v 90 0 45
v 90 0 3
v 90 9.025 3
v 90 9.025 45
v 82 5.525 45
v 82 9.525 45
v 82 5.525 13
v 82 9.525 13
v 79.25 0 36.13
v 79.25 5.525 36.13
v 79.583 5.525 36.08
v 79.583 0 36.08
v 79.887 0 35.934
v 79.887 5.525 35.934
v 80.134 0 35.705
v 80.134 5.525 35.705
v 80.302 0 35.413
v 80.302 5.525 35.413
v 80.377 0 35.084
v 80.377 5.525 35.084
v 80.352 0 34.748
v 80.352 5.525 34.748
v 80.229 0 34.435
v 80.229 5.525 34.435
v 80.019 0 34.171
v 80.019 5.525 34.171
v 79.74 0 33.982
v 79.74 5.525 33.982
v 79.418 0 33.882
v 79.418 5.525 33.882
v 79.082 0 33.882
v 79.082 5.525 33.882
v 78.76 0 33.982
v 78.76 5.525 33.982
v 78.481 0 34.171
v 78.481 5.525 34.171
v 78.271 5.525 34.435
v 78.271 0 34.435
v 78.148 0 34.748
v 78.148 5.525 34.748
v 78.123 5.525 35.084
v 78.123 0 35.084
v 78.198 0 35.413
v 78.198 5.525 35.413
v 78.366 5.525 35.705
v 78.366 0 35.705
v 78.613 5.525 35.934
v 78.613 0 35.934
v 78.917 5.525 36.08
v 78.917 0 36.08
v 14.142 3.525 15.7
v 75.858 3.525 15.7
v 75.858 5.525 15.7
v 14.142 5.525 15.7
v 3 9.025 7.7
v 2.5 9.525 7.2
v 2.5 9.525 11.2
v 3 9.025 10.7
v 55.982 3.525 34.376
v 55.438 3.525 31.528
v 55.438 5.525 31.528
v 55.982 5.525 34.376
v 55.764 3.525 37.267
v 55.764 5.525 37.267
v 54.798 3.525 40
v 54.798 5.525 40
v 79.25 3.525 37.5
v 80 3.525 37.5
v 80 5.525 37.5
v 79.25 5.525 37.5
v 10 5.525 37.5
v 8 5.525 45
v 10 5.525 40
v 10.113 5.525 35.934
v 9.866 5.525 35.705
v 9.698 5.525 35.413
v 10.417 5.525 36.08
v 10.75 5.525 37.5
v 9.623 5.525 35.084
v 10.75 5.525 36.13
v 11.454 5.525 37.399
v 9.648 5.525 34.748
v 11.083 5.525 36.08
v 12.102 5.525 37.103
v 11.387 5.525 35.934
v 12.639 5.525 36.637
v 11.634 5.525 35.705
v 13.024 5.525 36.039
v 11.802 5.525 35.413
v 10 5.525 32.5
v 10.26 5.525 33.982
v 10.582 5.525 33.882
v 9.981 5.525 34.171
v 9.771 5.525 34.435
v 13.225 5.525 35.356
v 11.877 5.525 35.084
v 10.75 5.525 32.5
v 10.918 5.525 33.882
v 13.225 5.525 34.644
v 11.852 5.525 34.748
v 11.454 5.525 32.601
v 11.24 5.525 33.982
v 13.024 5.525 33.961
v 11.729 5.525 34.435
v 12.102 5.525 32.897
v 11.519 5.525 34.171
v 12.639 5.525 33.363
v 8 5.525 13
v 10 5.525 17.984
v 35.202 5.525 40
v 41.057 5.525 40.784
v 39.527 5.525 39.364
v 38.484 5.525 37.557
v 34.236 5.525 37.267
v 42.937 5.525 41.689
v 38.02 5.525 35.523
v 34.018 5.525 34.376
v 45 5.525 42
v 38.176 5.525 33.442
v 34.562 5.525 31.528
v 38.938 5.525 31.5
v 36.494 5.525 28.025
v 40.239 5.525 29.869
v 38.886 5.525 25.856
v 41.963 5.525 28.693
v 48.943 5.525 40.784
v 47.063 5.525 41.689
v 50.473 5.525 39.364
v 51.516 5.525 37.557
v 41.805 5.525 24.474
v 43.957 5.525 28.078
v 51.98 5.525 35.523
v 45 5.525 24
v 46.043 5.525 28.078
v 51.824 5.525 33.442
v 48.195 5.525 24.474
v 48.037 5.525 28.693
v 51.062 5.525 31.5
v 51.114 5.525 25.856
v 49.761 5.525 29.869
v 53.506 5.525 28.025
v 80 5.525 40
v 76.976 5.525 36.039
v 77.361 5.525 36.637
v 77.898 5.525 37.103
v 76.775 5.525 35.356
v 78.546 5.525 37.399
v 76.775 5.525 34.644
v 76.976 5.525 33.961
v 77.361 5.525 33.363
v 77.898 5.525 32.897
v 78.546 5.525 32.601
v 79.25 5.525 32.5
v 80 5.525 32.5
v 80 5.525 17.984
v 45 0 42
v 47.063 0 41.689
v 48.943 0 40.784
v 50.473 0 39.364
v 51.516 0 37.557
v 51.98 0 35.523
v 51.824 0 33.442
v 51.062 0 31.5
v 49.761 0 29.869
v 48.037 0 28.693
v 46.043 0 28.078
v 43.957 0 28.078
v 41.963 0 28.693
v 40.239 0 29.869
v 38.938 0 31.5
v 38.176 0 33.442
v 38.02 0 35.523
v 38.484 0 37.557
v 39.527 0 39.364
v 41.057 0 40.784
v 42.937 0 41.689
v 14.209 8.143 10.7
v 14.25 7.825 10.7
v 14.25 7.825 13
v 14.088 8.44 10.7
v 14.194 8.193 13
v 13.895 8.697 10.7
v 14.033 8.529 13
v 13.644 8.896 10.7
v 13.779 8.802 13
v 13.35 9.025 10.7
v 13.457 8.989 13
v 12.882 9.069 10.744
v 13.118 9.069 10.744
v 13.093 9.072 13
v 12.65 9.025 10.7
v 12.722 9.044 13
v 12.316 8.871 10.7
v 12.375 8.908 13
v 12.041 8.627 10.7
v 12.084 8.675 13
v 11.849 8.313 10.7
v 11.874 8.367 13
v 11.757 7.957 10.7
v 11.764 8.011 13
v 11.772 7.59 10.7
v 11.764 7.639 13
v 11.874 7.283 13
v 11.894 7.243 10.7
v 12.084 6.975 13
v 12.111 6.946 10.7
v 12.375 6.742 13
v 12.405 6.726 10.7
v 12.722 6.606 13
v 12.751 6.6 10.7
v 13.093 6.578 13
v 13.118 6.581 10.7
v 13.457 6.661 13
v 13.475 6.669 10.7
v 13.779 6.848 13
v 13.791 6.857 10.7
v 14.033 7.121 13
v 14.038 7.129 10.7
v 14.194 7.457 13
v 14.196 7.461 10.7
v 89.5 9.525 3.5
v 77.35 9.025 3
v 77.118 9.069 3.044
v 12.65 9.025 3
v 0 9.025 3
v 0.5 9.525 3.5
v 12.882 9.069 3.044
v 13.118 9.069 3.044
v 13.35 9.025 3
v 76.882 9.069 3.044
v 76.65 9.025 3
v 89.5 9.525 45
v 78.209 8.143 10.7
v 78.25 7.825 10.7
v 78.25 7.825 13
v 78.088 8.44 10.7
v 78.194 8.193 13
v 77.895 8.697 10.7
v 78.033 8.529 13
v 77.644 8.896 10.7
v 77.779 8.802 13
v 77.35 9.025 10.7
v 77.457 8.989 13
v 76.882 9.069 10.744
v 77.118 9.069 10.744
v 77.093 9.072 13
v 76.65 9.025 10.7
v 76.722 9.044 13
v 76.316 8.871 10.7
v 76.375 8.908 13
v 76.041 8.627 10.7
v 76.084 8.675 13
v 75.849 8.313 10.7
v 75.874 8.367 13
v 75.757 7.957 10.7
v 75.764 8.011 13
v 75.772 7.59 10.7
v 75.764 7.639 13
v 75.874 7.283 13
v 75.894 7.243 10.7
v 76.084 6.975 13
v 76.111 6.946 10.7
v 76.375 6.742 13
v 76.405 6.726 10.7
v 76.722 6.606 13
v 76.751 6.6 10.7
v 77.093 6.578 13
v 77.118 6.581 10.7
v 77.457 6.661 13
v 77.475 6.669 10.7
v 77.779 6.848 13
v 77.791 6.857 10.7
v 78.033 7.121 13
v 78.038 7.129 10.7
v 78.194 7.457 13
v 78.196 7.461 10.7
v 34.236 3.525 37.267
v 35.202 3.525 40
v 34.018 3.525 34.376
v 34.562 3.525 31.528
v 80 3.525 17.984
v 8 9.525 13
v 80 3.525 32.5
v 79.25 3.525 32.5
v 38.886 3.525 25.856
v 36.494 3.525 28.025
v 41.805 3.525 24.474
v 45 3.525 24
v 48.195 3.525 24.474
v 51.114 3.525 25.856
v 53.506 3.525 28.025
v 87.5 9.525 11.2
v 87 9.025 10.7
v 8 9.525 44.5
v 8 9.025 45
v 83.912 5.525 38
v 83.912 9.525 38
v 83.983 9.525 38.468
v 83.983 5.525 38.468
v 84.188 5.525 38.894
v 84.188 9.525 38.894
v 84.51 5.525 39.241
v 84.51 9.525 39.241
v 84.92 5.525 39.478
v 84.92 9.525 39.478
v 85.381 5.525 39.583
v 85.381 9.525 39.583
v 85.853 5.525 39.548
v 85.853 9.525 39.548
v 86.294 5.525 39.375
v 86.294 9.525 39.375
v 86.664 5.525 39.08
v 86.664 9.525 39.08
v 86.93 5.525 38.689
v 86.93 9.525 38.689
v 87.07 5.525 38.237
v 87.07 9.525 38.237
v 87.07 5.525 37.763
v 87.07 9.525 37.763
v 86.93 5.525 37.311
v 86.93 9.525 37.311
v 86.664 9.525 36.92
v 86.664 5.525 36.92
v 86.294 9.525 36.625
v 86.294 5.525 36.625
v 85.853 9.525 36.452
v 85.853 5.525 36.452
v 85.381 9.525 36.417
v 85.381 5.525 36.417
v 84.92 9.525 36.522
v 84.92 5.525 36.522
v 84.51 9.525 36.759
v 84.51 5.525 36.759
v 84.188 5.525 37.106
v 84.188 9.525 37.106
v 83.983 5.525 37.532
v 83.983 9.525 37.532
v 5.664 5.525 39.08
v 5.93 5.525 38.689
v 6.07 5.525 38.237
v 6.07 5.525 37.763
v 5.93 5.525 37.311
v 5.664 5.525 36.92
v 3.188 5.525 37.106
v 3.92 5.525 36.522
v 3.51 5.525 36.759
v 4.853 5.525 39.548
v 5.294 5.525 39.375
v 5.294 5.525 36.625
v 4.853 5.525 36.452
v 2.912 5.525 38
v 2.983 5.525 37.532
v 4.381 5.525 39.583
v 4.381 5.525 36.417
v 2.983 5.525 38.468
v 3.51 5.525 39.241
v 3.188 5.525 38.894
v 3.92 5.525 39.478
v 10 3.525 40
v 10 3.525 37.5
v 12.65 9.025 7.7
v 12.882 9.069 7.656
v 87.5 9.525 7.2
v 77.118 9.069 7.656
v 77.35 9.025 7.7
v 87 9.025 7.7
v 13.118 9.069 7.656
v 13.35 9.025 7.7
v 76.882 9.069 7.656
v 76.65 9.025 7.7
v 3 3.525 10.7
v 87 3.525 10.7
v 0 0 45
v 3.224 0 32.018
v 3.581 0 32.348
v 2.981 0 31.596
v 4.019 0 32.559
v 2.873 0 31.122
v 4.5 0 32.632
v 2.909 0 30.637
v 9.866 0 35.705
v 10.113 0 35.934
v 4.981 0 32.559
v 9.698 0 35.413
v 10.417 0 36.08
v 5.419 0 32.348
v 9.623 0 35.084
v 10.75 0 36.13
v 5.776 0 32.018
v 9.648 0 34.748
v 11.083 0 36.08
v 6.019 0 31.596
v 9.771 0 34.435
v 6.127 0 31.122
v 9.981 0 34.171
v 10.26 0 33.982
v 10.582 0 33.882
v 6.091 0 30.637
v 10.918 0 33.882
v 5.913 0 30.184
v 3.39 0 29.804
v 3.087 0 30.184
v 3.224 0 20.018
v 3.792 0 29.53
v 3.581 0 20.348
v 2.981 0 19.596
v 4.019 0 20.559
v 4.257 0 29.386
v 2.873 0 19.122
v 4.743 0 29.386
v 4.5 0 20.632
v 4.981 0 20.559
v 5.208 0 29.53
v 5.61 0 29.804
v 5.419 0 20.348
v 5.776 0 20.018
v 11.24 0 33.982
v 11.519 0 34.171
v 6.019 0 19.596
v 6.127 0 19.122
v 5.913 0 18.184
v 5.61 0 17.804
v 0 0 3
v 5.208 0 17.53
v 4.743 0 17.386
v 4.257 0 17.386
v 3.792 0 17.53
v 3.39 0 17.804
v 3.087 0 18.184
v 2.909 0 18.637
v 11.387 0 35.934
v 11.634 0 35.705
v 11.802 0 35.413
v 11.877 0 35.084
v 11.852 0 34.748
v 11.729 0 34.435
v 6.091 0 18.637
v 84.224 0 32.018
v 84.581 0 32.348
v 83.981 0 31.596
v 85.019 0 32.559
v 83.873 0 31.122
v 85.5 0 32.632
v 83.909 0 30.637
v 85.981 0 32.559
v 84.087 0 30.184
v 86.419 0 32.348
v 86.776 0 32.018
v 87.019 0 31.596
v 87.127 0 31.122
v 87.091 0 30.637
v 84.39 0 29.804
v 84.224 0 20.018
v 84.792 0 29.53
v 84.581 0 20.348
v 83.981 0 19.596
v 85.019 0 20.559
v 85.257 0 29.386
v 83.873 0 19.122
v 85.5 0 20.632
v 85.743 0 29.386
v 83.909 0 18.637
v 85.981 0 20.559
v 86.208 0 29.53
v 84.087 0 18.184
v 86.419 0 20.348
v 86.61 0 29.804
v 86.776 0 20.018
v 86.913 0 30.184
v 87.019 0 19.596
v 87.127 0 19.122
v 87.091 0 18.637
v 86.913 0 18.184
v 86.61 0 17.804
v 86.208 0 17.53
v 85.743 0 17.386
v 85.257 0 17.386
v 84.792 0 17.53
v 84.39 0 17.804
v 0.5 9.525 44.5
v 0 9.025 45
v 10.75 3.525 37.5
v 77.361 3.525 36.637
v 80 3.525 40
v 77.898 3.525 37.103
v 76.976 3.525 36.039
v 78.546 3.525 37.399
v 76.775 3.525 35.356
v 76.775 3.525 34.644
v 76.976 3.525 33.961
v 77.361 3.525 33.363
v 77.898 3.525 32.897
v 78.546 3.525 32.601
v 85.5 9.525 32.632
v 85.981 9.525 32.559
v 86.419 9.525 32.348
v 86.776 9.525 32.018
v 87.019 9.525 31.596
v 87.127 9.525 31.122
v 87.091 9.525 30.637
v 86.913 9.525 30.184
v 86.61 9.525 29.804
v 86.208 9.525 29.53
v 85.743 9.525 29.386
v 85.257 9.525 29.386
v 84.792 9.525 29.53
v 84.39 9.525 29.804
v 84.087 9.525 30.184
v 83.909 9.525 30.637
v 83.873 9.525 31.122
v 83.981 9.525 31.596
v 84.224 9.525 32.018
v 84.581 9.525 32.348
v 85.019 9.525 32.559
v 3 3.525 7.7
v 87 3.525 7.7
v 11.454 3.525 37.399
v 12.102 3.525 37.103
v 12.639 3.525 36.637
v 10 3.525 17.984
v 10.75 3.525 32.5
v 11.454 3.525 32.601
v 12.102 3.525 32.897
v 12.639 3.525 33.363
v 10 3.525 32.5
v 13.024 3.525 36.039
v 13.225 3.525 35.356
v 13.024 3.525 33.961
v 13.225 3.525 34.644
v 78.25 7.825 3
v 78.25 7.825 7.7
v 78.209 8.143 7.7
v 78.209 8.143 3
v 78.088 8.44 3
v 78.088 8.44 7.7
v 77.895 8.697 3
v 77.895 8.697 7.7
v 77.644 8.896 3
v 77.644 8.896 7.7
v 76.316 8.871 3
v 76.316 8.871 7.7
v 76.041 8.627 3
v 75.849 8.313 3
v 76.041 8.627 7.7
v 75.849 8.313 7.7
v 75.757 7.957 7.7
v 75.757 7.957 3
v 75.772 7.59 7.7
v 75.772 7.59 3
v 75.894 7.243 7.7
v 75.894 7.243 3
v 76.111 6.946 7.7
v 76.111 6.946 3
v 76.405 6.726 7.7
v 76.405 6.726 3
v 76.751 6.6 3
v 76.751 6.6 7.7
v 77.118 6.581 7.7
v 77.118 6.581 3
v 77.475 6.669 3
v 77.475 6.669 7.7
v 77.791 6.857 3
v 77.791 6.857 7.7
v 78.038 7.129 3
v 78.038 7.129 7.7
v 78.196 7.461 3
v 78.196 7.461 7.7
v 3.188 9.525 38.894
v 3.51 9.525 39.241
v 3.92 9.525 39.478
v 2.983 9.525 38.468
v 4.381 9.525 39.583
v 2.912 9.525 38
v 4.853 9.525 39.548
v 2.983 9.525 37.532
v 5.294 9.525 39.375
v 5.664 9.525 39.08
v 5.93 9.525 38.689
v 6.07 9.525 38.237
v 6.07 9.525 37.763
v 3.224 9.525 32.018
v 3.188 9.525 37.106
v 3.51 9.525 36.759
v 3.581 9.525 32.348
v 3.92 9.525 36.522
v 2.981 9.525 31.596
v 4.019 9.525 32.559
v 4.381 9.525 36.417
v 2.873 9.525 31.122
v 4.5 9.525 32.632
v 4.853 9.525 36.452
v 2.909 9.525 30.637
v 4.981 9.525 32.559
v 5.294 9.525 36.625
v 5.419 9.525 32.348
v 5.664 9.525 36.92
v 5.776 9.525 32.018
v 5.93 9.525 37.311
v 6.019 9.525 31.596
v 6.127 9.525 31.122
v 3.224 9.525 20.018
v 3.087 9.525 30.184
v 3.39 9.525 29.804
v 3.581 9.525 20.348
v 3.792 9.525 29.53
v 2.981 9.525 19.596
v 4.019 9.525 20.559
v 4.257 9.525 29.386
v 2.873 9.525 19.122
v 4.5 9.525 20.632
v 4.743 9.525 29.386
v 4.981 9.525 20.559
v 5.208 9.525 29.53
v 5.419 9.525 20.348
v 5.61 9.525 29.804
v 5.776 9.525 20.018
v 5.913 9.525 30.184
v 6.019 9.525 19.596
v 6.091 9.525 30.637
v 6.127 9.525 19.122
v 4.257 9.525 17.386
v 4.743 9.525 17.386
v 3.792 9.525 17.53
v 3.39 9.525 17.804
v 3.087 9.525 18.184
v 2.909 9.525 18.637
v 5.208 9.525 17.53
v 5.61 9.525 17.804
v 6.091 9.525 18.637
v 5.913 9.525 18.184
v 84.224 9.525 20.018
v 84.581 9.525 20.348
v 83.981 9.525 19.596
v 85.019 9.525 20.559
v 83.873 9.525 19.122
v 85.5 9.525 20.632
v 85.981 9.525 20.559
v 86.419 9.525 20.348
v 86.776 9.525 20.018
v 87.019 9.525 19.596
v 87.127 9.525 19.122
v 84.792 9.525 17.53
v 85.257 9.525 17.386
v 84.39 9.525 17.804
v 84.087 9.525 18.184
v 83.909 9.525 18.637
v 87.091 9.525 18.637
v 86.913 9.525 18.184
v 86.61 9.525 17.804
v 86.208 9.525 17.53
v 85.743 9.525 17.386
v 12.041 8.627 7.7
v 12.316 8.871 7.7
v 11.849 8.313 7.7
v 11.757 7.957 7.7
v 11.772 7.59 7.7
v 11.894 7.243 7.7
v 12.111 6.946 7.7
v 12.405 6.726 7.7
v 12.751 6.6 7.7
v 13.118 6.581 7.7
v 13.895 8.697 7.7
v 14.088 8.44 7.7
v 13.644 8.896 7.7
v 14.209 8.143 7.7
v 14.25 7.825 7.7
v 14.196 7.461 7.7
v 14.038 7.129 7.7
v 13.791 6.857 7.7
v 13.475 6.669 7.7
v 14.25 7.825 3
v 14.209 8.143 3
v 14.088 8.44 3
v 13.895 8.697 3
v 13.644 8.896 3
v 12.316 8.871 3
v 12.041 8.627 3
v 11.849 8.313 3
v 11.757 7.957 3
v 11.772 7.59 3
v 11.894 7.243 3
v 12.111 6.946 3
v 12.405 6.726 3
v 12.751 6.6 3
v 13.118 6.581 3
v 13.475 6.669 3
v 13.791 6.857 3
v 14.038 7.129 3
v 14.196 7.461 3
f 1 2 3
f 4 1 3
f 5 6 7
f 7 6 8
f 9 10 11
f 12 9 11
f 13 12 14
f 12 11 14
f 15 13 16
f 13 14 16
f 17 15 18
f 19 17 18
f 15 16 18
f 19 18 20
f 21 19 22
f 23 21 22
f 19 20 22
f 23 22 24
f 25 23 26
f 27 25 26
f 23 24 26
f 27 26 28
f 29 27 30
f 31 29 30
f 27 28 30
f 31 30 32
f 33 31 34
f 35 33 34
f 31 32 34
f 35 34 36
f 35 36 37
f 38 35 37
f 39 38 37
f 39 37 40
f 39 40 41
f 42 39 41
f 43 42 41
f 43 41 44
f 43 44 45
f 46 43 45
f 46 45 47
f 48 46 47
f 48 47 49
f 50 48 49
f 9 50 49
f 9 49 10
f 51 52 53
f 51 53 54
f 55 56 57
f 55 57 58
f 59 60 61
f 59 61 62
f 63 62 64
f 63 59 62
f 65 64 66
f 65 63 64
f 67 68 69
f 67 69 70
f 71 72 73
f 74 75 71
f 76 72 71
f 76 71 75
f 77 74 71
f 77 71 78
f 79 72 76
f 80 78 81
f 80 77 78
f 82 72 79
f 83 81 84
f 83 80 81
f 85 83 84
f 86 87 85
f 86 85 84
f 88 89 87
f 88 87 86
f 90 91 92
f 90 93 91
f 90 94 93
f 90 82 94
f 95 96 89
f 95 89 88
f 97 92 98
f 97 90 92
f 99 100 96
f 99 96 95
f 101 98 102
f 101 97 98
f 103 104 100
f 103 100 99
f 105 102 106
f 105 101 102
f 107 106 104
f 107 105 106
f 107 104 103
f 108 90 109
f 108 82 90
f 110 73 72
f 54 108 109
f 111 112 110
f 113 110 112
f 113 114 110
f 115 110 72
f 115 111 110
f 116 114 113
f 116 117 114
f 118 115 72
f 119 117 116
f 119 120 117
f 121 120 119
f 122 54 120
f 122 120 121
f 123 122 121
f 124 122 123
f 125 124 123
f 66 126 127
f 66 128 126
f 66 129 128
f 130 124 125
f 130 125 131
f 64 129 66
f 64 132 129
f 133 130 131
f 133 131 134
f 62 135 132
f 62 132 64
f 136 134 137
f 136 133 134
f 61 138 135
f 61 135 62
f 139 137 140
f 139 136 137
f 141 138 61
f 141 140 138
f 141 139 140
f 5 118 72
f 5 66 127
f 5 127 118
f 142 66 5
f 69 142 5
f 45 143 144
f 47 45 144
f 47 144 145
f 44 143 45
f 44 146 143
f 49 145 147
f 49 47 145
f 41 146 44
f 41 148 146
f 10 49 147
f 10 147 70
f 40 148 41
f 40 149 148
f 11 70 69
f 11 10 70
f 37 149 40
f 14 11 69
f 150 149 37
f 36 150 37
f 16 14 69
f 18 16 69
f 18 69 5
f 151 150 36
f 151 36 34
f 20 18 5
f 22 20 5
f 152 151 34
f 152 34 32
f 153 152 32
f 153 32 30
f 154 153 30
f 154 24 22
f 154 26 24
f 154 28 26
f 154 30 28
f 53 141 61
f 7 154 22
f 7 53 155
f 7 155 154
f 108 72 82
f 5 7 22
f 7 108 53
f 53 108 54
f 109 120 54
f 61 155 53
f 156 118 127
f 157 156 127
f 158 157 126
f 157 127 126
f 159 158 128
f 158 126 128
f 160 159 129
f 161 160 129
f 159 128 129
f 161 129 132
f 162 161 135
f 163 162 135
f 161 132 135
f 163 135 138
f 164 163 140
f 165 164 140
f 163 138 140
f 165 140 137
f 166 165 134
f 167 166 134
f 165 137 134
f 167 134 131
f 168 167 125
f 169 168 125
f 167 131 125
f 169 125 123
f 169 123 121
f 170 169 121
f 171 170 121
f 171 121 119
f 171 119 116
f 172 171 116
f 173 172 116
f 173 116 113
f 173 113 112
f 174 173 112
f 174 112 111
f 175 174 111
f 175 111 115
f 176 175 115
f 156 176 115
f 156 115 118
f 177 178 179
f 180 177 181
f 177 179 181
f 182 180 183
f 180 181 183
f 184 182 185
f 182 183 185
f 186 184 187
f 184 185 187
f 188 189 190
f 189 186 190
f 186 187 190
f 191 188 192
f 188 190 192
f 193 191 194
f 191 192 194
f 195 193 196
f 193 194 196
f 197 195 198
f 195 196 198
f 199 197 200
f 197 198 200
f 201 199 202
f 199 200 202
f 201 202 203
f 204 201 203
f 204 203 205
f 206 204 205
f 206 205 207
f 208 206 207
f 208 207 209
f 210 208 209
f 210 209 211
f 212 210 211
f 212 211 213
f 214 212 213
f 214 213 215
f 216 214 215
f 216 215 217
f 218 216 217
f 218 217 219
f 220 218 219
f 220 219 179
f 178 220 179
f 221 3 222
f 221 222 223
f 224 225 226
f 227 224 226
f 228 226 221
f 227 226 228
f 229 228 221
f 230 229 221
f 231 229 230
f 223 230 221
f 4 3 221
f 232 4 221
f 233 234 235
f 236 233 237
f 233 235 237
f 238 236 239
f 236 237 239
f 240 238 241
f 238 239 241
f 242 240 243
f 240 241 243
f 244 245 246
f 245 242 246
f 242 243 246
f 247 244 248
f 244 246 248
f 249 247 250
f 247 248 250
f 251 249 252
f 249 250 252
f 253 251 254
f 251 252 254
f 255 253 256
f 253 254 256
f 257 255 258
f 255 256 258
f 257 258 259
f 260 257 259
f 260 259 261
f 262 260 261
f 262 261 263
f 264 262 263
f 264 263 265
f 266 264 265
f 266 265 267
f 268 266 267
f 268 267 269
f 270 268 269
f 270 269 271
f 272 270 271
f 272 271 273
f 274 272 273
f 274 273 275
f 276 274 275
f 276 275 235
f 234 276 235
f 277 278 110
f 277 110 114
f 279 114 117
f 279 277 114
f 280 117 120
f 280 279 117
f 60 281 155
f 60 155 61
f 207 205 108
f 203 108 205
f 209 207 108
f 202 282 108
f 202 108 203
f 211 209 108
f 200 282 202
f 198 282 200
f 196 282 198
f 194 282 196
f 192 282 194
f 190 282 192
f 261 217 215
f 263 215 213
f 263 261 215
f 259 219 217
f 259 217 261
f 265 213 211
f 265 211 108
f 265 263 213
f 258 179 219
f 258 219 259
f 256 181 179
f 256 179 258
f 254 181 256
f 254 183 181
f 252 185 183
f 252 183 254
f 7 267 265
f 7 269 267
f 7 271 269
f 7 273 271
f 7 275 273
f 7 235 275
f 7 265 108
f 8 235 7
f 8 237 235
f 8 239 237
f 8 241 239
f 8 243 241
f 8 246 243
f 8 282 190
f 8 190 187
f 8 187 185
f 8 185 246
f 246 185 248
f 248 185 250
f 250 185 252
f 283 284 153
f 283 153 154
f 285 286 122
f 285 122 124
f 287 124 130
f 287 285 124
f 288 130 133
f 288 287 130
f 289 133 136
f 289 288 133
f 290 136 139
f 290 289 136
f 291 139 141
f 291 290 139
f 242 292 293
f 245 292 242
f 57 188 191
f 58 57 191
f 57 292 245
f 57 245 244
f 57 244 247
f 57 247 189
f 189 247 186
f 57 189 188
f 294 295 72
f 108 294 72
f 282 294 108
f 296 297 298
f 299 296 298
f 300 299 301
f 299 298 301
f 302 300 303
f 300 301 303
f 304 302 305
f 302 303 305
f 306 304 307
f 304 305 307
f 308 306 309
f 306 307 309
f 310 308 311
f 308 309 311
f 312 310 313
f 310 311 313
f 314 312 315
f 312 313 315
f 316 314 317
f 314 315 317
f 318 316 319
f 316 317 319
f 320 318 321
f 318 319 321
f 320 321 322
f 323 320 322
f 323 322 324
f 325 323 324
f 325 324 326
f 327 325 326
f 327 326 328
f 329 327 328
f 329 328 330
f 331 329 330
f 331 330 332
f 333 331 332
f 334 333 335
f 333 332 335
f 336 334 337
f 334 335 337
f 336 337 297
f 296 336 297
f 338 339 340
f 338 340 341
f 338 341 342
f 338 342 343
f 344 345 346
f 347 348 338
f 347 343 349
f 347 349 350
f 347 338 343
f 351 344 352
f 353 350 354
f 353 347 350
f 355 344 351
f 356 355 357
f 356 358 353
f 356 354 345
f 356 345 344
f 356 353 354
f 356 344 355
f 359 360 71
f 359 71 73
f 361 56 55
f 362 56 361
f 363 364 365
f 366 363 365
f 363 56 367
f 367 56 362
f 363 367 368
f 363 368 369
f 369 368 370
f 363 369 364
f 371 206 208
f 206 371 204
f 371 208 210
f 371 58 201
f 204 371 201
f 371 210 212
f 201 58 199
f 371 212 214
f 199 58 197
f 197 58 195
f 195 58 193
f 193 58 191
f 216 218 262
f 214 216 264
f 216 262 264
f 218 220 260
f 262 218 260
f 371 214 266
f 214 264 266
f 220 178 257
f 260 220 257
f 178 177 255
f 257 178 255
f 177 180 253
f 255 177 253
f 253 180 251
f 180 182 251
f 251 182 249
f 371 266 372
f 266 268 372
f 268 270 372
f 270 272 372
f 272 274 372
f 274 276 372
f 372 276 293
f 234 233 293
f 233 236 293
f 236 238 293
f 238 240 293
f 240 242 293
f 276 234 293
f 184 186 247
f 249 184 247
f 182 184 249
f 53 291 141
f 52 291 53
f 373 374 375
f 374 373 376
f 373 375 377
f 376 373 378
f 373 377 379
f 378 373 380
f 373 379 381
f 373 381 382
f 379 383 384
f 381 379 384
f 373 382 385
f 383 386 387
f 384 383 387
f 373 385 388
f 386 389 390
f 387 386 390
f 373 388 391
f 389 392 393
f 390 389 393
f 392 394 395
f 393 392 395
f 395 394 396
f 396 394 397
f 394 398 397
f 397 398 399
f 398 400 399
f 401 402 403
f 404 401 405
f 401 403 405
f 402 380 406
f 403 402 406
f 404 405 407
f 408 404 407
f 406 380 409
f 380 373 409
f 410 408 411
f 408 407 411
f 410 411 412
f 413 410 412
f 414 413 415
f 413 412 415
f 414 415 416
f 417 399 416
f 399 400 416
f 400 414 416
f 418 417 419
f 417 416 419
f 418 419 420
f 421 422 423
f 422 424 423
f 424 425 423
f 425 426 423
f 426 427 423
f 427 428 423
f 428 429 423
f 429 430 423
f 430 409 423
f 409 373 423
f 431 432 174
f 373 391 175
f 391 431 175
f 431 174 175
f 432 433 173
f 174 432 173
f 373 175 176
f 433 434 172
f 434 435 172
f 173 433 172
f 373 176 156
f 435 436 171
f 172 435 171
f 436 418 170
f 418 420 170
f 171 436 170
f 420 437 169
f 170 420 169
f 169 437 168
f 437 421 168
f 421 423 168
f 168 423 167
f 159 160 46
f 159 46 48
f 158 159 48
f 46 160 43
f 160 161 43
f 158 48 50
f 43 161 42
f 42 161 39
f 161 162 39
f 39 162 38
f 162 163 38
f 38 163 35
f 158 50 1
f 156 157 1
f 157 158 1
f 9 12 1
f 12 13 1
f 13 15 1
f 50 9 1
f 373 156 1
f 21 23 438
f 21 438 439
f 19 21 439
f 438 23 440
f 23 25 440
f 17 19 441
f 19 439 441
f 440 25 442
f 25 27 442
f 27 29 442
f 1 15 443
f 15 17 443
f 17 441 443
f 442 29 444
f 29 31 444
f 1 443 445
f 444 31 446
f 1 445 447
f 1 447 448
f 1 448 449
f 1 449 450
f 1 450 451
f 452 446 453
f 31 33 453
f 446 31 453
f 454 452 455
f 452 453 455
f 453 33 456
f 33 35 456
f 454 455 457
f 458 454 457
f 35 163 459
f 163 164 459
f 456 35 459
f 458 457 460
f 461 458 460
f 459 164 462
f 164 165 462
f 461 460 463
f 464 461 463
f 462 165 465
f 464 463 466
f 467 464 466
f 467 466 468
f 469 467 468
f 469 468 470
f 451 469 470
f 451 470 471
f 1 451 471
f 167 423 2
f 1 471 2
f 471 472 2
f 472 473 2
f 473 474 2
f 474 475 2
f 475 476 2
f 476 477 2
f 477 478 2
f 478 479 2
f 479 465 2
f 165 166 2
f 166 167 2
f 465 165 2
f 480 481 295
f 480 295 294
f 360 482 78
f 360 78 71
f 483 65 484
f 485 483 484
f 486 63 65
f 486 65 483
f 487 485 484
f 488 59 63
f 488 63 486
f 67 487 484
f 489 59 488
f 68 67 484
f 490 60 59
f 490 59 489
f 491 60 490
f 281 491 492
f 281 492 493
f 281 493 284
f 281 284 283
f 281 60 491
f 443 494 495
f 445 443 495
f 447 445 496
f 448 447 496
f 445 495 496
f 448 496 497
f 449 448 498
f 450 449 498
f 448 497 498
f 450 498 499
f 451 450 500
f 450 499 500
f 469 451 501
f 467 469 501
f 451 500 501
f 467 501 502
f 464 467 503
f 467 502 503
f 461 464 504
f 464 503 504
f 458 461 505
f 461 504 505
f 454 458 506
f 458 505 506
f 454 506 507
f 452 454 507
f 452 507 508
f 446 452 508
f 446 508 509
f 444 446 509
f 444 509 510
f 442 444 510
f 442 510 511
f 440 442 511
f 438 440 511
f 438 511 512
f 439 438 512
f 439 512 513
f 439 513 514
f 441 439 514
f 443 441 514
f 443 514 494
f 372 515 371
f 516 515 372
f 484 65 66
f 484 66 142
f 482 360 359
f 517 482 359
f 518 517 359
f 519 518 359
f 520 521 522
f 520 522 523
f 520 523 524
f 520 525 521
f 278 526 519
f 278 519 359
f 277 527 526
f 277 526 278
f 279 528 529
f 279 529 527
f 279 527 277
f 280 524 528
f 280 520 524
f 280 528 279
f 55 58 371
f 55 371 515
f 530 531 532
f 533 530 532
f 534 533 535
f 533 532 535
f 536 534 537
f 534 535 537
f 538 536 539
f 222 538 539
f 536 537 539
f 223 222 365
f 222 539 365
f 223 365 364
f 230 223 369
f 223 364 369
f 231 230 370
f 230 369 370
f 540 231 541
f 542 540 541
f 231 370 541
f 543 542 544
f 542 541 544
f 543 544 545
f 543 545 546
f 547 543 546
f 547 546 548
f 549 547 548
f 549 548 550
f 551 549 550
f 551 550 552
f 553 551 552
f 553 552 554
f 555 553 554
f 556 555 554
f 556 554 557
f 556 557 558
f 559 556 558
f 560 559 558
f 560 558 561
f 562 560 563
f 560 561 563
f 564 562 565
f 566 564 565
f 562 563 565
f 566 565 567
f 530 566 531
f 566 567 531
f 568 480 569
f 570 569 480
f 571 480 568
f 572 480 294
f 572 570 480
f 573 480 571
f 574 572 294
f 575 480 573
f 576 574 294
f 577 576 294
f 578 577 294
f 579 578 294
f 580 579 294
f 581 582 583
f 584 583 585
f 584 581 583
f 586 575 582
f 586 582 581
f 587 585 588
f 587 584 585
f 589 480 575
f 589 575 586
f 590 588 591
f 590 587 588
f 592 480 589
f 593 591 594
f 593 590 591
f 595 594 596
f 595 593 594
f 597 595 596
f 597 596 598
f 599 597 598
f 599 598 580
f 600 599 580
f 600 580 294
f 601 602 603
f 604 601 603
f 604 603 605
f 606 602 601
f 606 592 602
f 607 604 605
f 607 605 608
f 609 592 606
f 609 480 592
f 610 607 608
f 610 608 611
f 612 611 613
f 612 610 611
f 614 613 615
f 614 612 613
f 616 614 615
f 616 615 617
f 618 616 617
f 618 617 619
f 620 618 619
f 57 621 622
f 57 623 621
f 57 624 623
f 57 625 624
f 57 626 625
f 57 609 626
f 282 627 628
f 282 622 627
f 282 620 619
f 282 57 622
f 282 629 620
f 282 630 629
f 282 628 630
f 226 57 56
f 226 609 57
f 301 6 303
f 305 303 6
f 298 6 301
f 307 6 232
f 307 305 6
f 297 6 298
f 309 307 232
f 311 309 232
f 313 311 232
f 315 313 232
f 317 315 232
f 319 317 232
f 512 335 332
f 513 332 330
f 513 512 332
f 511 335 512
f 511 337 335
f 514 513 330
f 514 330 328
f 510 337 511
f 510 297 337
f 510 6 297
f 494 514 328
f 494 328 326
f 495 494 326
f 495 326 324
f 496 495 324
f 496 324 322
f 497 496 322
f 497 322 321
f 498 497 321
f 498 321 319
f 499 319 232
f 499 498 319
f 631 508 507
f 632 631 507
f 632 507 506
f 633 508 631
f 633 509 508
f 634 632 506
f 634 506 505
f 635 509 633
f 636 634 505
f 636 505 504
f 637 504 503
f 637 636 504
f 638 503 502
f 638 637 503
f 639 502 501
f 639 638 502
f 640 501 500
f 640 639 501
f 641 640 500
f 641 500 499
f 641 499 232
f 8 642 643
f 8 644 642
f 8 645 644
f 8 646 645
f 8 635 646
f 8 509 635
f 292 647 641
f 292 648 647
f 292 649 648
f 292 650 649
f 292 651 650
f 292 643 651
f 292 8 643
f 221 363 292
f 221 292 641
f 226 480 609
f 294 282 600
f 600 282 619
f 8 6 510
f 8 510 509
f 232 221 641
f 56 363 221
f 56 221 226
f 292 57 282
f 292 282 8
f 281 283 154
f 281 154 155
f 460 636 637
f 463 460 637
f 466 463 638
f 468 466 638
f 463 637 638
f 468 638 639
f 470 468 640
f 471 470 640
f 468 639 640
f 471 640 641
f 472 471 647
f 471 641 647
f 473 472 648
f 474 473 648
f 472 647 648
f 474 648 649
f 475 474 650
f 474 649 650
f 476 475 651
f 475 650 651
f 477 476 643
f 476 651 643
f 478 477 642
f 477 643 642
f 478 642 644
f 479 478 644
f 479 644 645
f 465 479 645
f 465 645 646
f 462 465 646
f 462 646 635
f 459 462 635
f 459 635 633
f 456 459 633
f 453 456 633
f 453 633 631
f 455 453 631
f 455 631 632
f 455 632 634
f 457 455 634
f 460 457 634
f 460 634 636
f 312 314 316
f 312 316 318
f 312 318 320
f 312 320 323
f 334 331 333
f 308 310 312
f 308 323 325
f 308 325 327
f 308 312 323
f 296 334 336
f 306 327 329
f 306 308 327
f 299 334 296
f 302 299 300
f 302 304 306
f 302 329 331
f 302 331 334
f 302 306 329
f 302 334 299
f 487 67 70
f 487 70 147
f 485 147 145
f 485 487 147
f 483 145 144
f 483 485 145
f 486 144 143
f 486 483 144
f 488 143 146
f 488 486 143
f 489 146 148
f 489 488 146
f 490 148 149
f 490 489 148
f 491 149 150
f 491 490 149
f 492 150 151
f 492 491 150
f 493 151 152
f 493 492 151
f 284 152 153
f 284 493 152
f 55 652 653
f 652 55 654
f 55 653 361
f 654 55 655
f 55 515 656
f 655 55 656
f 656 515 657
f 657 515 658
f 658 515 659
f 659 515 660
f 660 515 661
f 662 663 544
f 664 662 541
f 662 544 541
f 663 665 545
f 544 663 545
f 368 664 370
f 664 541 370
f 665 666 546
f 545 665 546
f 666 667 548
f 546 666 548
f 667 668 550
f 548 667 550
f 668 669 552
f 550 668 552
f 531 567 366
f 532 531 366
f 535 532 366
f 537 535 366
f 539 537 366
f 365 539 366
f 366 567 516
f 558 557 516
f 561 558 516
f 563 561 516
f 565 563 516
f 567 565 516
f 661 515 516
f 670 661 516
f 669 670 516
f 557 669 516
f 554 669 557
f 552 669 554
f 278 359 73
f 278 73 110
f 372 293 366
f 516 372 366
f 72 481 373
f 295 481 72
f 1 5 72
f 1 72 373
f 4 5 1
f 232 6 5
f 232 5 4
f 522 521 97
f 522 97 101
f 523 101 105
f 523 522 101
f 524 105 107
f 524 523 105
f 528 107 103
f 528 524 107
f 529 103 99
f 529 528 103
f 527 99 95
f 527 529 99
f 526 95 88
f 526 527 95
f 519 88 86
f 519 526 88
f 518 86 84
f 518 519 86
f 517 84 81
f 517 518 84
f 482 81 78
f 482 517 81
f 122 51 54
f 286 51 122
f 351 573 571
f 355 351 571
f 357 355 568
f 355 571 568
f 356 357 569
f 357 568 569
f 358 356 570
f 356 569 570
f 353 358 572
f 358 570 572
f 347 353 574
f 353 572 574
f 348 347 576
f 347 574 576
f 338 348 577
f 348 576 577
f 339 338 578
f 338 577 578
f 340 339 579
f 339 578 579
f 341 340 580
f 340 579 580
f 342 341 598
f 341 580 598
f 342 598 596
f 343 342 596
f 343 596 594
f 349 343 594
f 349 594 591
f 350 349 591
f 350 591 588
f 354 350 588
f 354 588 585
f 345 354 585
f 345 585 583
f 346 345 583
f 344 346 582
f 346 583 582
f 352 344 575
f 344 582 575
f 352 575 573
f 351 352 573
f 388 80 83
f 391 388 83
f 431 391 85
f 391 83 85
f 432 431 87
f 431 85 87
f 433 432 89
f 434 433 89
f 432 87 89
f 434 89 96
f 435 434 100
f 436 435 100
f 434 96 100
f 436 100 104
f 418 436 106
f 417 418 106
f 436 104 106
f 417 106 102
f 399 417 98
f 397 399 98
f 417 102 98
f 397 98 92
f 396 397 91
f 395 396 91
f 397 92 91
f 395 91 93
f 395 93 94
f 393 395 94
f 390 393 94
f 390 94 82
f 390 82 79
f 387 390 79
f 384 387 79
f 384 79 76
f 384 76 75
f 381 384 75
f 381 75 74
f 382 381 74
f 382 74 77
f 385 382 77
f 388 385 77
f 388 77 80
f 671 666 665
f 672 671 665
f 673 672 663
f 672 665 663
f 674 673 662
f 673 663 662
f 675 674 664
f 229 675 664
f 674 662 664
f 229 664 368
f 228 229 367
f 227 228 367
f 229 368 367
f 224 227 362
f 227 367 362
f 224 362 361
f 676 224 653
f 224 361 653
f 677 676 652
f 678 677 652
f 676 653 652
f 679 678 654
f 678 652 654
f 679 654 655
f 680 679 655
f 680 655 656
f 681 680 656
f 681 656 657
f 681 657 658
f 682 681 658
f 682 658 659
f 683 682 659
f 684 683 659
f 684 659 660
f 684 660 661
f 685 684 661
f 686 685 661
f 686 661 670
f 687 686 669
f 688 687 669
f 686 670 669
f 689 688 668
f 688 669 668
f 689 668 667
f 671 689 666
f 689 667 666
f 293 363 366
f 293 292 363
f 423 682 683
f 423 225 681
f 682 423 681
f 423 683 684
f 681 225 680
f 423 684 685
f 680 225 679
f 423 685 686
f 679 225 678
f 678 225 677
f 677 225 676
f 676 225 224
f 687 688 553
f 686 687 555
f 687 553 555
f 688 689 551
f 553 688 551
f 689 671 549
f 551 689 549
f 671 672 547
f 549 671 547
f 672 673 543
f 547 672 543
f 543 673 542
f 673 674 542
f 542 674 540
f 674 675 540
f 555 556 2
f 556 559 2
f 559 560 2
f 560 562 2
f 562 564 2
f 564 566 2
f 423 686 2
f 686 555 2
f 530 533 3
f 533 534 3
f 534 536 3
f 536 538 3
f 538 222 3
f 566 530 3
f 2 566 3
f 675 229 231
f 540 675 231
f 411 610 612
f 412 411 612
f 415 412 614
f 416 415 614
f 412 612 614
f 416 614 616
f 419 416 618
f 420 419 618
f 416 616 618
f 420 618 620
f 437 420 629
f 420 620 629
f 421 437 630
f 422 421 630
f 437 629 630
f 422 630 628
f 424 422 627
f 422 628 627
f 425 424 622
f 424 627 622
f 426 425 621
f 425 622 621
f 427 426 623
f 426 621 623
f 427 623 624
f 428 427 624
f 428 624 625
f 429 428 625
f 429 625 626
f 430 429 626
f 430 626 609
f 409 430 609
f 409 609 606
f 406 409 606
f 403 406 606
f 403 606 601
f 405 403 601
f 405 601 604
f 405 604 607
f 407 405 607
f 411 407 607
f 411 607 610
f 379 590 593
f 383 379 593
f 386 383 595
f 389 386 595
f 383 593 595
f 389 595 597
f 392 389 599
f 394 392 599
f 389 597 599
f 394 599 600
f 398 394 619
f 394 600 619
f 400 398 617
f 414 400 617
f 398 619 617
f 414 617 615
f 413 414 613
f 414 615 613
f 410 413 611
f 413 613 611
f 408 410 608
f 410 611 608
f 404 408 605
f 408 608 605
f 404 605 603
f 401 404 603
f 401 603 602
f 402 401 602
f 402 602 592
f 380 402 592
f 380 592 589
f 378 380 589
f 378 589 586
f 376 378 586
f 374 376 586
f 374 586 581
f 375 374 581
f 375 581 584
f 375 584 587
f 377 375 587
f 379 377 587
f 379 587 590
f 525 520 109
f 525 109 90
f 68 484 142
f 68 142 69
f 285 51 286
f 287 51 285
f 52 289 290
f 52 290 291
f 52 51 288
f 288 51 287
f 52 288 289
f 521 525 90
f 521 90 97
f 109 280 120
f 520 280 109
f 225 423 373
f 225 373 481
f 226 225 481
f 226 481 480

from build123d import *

# Parameters (mm, degrees)
SKETCH1_W               = 90
SKETCH1_H               = 9.525
SKETCH1_R               = 2
BOSS_EXTRUDE1_DEPTH     = 45
SKETCH2_R               = 7
CUT_EXTRUDE2_DEPTH      = 10
SKETCH3_R               = 1.63195
SKETCH3_R_2             = 7
SKETCH3_R_3             = 1.1303
CUT_EXTRUDE3_DEPTH      = 10
SKETCH4_W               = 84
SKETCH4_H               = 3
CUT_EXTRUDE4_DEPTH      = 6
CUT_EXTRUDE6_DEPTH      = 102.072872844
CUT_EXTRUDE6_DEPTH_BACK = 6
SKETCH7_W               = 90
SKETCH7_H               = 3
CUT_EXTRUDE7_DEPTH      = 10
SKETCH9_W               = 74
SKETCH9_H               = 32
CUT_EXTRUDE8_DEPTH      = 4
CUT_EXTRUDE9_REACH      = 97.993
SKETCH10_R              = 1.25
CHAMFER2_SIZE           = 0.5
SKETCH11_R              = 1.5875
CUT_EXTRUDE10_DEPTH     = 4


with BuildPart() as part:
    # Sketch1 → Boss-Extrude1 (new body)
    # profile 1 of 3: a face of its own
    with BuildSketch(Plane.XY):
        with Locations((45, 4.7625)):
            Rectangle(SKETCH1_W, SKETCH1_H)
        with Locations((60, 4.7625)):
            Circle(SKETCH1_R, mode=Mode.SUBTRACT)
        with Locations((30, 4.7625)):
            Circle(SKETCH1_R, mode=Mode.SUBTRACT)
    # profile 2 of 3: a face of its own
    with BuildSketch(Plane.XY):
        with Locations((30, 4.7625)):
            Circle(SKETCH1_R)
    # profile 3 of 3: a face of its own
    with BuildSketch(Plane.XY):
        with Locations((60, 4.7625)):
            Circle(SKETCH1_R)
    extrude(amount=BOSS_EXTRUDE1_DEPTH)

    # Sketch2 → Cut-Extrude2 (cut)
    with BuildSketch(Plane(origin=(0, 9.525, 0), x_dir=(1, 0, 0), z_dir=(0, 1, 0))):
        with Locations(Location((45, -35, 0), (0, 0, 270))):
            Circle(SKETCH2_R)
    extrude(amount=-CUT_EXTRUDE2_DEPTH, mode=Mode.SUBTRACT)

    # Sketch3 → Cut-Extrude3 (cut)
    with BuildSketch(Plane(origin=(0, 9.525, 0), x_dir=(1, 0, 0), z_dir=(0, 1, 0))):
        with Locations(Location((85.5, -31, 0), (0, 0, 270))):
            Circle(SKETCH3_R)
        with Locations(Location((4.5, -31, 0), (0, 0, 270))):
            Circle(SKETCH3_R)
        with Locations(Location((45, -35, 0), (0, 0, 270))):
            Circle(SKETCH3_R_2)
        with Locations(Location((85.5, -19, 0), (0, 0, 270))):
            Circle(SKETCH3_R)
        with Locations(Location((4.5, -19, 0), (0, 0, 270))):
            Circle(SKETCH3_R)
        with Locations(Location((79.25, -35, 0), (0, 0, 270))):
            Circle(SKETCH3_R_3)
        with Locations(Location((10.75, -35, 0), (0, 0, 270))):
            Circle(SKETCH3_R_3)
    extrude(amount=-CUT_EXTRUDE3_DEPTH, mode=Mode.SUBTRACT)

    # Sketch4 → Cut-Extrude4 (cut)
    with BuildSketch(Plane(origin=(0, 9.525, 0), x_dir=(1, 0, 0), z_dir=(0, 1, 0))):
        with Locations((45, -9.2)):
            Rectangle(SKETCH4_W, SKETCH4_H)
    extrude(amount=-CUT_EXTRUDE4_DEPTH, mode=Mode.SUBTRACT)

    # Sketch6 → Cut-Extrude6 (cut, two sides: drawn at the far end of the back side and taken through both)
    with BuildSketch(Plane(origin=(0, 9.525, 0), x_dir=(1, 0, 0), z_dir=(0, 1, 0)).offset(-CUT_EXTRUDE6_DEPTH_BACK)):
        with BuildLine():
            ThreePointArc((10.75, -32.5), (13.25, -35), (10.75, -37.5))
            Line((10.75, -37.5), (10, -37.5))
            Line((10, -37.5), (10, -40))
            Line((10, -40), (35.202041029, -40))
            ThreePointArc((35.202041029, -40), (34.031236019, -35.828381989), (34.562237569, -31.528240298))
            Line((34.562237569, -31.528240298), (10, -17.983920725))
            Line((10, -17.983920725), (10, -32.5))
            Line((10, -32.5), (10.75, -32.5))
        make_face()
        with BuildLine():
            Line((14.141825149, -15.7), (36.493753196, -28.025491752))
            ThreePointArc((36.493753196, -28.025491752), (45, -24), (53.506246804, -28.025491752))
            Line((53.506246804, -28.025491752), (75.858174851, -15.7))
            Line((75.858174851, -15.7), (14.141825149, -15.7))
        make_face()
        with BuildLine():
            ThreePointArc((55.437762431, -31.528240298), (55.968763981, -35.828381989), (54.797958971, -40))
            Line((54.797958971, -40), (80, -40))
            Line((80, -40), (80, -37.5))
            Line((80, -37.5), (79.25, -37.5))
            ThreePointArc((79.25, -37.5), (76.75, -35), (79.25, -32.5))
            Line((79.25, -32.5), (80, -32.5))
            Line((80, -32.5), (80, -17.983920725))
            Line((80, -17.983920725), (55.437762431, -31.528240298))
        make_face()
    extrude(amount=CUT_EXTRUDE6_DEPTH + CUT_EXTRUDE6_DEPTH_BACK, mode=Mode.SUBTRACT)

    # Sketch7 → Cut-Extrude7 (cut)
    with BuildSketch(Plane(origin=(0, 9.525, 0), x_dir=(1, 0, 0), z_dir=(0, 1, 0))):
        with Locations((45, -1.5)):
            Rectangle(SKETCH7_W, SKETCH7_H)
    extrude(amount=-CUT_EXTRUDE7_DEPTH, mode=Mode.SUBTRACT)

    # Sketch9 → Cut-Extrude8 (cut)
    with BuildSketch(Plane(origin=(0, 9.525, 0), x_dir=(1, 0, 0), z_dir=(0, 1, 0))):
        with Locations((45, -29)):
            Rectangle(SKETCH9_W, SKETCH9_H)
    extrude(amount=-CUT_EXTRUDE8_DEPTH, mode=Mode.SUBTRACT)

    # Cut-Extrude9: up to this face of the body (flat: up to its plane)
    cut_extrude9_end = Plane(part.part.faces().sort_by_distance((45, 4.7625, 3))[0])
    # Sketch10 → Cut-Extrude9 (cut, up to the picked face)
    with BuildSketch(Plane.XY.offset(13), mode=Mode.PRIVATE) as cut_extrude9_sk1:
        with Locations((77, 7.825)):
            Circle(SKETCH10_R)
    cut_extrude9_tool1 = split(extrude(cut_extrude9_sk1.sketch, amount=-CUT_EXTRUDE9_REACH, mode=Mode.PRIVATE), bisect_by=cut_extrude9_end, keep=Keep.BOTH, mode=Mode.PRIVATE)
    # Sketch10 → Cut-Extrude9 (cut, up to the picked face)
    with BuildSketch(Plane.XY.offset(13), mode=Mode.PRIVATE) as cut_extrude9_sk2:
        with Locations((13, 7.825)):
            Circle(SKETCH10_R)
    cut_extrude9_tool2 = split(extrude(cut_extrude9_sk2.sketch, amount=-CUT_EXTRUDE9_REACH, mode=Mode.PRIVATE), bisect_by=cut_extrude9_end, keep=Keep.BOTH, mode=Mode.PRIVATE)
    add(cut_extrude9_tool1.solids().sort_by(Axis((77, 7.825, 13), (0, 0, -1)))[0], mode=Mode.SUBTRACT)
    add(cut_extrude9_tool2.solids().sort_by(Axis((13, 7.825, 13), (0, 0, -1)))[0], mode=Mode.SUBTRACT)

    # Chamfer2
    # the kernel refuses this chamfer: 0.5 mm, written as the material it takes off along each edge
    with BuildSketch(Plane(origin=(9.285841494, 9.525, 45), x_dir=(0, -0.999621916911297, 0.0274958766105822), z_dir=(-1, 0, 0))) as chamfer2_piece_1:
        Polygon((CHAMFER2_SIZE * 0.999621916911, -CHAMFER2_SIZE * 0.0274958766106), (-CHAMFER2_SIZE * 0.0274958766106, -CHAMFER2_SIZE * 0.999621916911), (0, 0), align=None)
    extrude(amount=10.571682988, mode=Mode.SUBTRACT)
    with BuildSketch(Plane(origin=(-1.285841494, 9.525, 3), x_dir=(0, -0.9996219169112968, -0.02749587661058651), z_dir=(1, 0, 0))) as chamfer2_piece_2:
        Polygon((CHAMFER2_SIZE * 0.999621916911, -CHAMFER2_SIZE * 0.0274958766106), (-CHAMFER2_SIZE * 0.0274958766106, -CHAMFER2_SIZE * 0.999621916911), (0, 0), align=None)
    extrude(amount=92.571682988, mode=Mode.SUBTRACT)
    with BuildSketch(Plane(origin=(87, 9.525, 10.7), x_dir=(0.999621916911297, 0.027495876610582292, 0), z_dir=(0, 0, -1)), Plane(origin=(3, 9.525, 7.7), x_dir=(-0.9996219169112968, 0.027495876610585408, -1.1837901526131803e-15), z_dir=(0, 0, 1))) as chamfer2_piece_3:
        Polygon((CHAMFER2_SIZE * 0.999621916911, CHAMFER2_SIZE * 0.0274958766106), (-CHAMFER2_SIZE * 0.0274958766106, CHAMFER2_SIZE * 0.999621916911), (0, 0), align=None)
    extrude(amount=3, mode=Mode.SUBTRACT)
    with BuildSketch(Plane(origin=(87, 9.525, 7.7), x_dir=(0, 0.0274958766105822, -0.999621916911297), z_dir=(-1, 0, 0)), Plane(origin=(3, 9.525, 10.7), x_dir=(0, 0.027495876610585647, 0.9996219169112968), z_dir=(1, 0, 0))) as chamfer2_piece_4:
        Polygon((CHAMFER2_SIZE * 0.999621916911, CHAMFER2_SIZE * 0.0274958766106), (-CHAMFER2_SIZE * 0.0274958766106, CHAMFER2_SIZE * 0.999621916911), (0, 0), align=None)
    extrude(amount=84, mode=Mode.SUBTRACT)
    with BuildSketch(Plane(origin=(0, 9.525, 1.714158506), x_dir=(-0.02749587661058639, -0.9996219169112968, 0), z_dir=(0, 0, 1))) as chamfer2_piece_5:
        Polygon((CHAMFER2_SIZE * 0.999621916911, CHAMFER2_SIZE * 0.0274958766106), (-CHAMFER2_SIZE * 0.0274958766106, CHAMFER2_SIZE * 0.999621916911), (0, 0), align=None)
    extrude(amount=44.571682988, mode=Mode.SUBTRACT)
    with BuildSketch(Plane(origin=(90, 9.525, 1.714158506), x_dir=(0.0274958766105822, -0.999621916911297, 0), z_dir=(0, 0, 1))) as chamfer2_piece_6:
        Polygon((CHAMFER2_SIZE * 0.999621916911, -CHAMFER2_SIZE * 0.0274958766106), (-CHAMFER2_SIZE * 0.0274958766106, -CHAMFER2_SIZE * 0.999621916911), (0, 0), align=None)
    extrude(amount=44.571682988, mode=Mode.SUBTRACT)
    with BuildSketch(Plane(origin=(87, 9.525, 11.985841494), x_dir=(0.9996219169112968, 0.02749587661058574, 0), z_dir=(0, 0, -1))) as chamfer2_piece_7a_section:
        Polygon((CHAMFER2_SIZE * 0.999621916911, CHAMFER2_SIZE * 0.0274958766106), (-CHAMFER2_SIZE * 0.0274958766106, CHAMFER2_SIZE * 0.999621916911), (0, 0), align=None)
    chamfer2_piece_7a = extrude(amount=4.285841494, mode=Mode.PRIVATE)
    chamfer2_piece_7a = split(chamfer2_piece_7a, bisect_by=Plane(origin=(87.164896813, 9.360103187, 10.7), z_dir=(0, 0, 1)), keep=Keep.TOP, mode=Mode.PRIVATE)
    with BuildSketch(Plane(origin=(3, 9.525, 10.7), x_dir=(0, 0.027495876610585647, 0.9996219169112968), z_dir=(1, 0, 0))) as chamfer2_piece_7b_section:
        Polygon((CHAMFER2_SIZE * 0.999621916911, CHAMFER2_SIZE * 0.0274958766106), (-CHAMFER2_SIZE * 0.0274958766106, CHAMFER2_SIZE * 0.999621916911), (0, 0), align=None)
    chamfer2_piece_7b = extrude(amount=85.285841494, mode=Mode.PRIVATE)
    chamfer2_piece_7b = split(chamfer2_piece_7b, bisect_by=Plane(origin=(87, 9.360103187, 10.864896813), z_dir=(1, 0, 0)), keep=Keep.TOP, mode=Mode.PRIVATE)
    chamfer2_piece_7 = chamfer2_piece_7a & chamfer2_piece_7b
    add(chamfer2_piece_7, mode=Mode.SUBTRACT)
    with BuildSketch(Plane(origin=(87, 9.525, 10.7), x_dir=(0.999621916911297, 0.027495876610582292, 0), z_dir=(0, 0, -1))) as chamfer2_piece_8a_section:
        Polygon((CHAMFER2_SIZE * 0.999621916911, CHAMFER2_SIZE * 0.0274958766106), (-CHAMFER2_SIZE * 0.0274958766106, CHAMFER2_SIZE * 0.999621916911), (0, 0), align=None)
    chamfer2_piece_8a = extrude(amount=4.285841494, mode=Mode.PRIVATE)
    chamfer2_piece_8a = split(chamfer2_piece_8a, bisect_by=Plane(origin=(87.164896813, 9.360103187, 7.7), z_dir=(0, 0, -1)), keep=Keep.TOP, mode=Mode.PRIVATE)
    with BuildSketch(Plane(origin=(88.285841494, 9.525, 7.7), x_dir=(0, 0.027495876610585647, -0.9996219169112968), z_dir=(-1, 0, 0))) as chamfer2_piece_8b_section:
        Polygon((CHAMFER2_SIZE * 0.999621916911, CHAMFER2_SIZE * 0.0274958766106), (-CHAMFER2_SIZE * 0.0274958766106, CHAMFER2_SIZE * 0.999621916911), (0, 0), align=None)
    chamfer2_piece_8b = extrude(amount=85.285841494, mode=Mode.PRIVATE)
    chamfer2_piece_8b = split(chamfer2_piece_8b, bisect_by=Plane(origin=(87, 9.360103187, 7.535103187), z_dir=(1, 0, 0)), keep=Keep.TOP, mode=Mode.PRIVATE)
    chamfer2_piece_8 = chamfer2_piece_8a & chamfer2_piece_8b
    add(chamfer2_piece_8, mode=Mode.SUBTRACT)
    with BuildSketch(Plane(origin=(87, 9.525, 7.7), x_dir=(0, 0.0274958766105822, -0.999621916911297), z_dir=(-1, 0, 0))) as chamfer2_piece_9a_section:
        Polygon((CHAMFER2_SIZE * 0.999621916911, CHAMFER2_SIZE * 0.0274958766106), (-CHAMFER2_SIZE * 0.0274958766106, CHAMFER2_SIZE * 0.999621916911), (0, 0), align=None)
    chamfer2_piece_9a = extrude(amount=85.285841494, mode=Mode.PRIVATE)
    chamfer2_piece_9a = split(chamfer2_piece_9a, bisect_by=Plane(origin=(3, 9.360103187, 7.535103187), z_dir=(-1, 0, 0)), keep=Keep.TOP, mode=Mode.PRIVATE)
    with BuildSketch(Plane(origin=(3, 9.525, 6.414158506), x_dir=(-0.9996219169112968, 0.027495876610585623, -1.1837901526131803e-15), z_dir=(0, 0, 1))) as chamfer2_piece_9b_section:
        Polygon((CHAMFER2_SIZE * 0.999621916911, CHAMFER2_SIZE * 0.0274958766106), (-CHAMFER2_SIZE * 0.0274958766106, CHAMFER2_SIZE * 0.999621916911), (0, 0), align=None)
    chamfer2_piece_9b = extrude(amount=4.285841494, mode=Mode.PRIVATE)
    chamfer2_piece_9b = split(chamfer2_piece_9b, bisect_by=Plane(origin=(2.835103187, 9.360103187, 7.7), z_dir=(0, 0, -1)), keep=Keep.TOP, mode=Mode.PRIVATE)
    chamfer2_piece_9 = chamfer2_piece_9a & chamfer2_piece_9b
    add(chamfer2_piece_9, mode=Mode.SUBTRACT)
    with BuildSketch(Plane(origin=(1.714158506, 9.525, 10.7), x_dir=(0, 0.027495876610585647, 0.9996219169112968), z_dir=(1, 0, 0))) as chamfer2_piece_10a_section:
        Polygon((CHAMFER2_SIZE * 0.999621916911, CHAMFER2_SIZE * 0.0274958766106), (-CHAMFER2_SIZE * 0.0274958766106, CHAMFER2_SIZE * 0.999621916911), (0, 0), align=None)
    chamfer2_piece_10a = extrude(amount=85.285841494, mode=Mode.PRIVATE)
    chamfer2_piece_10a = split(chamfer2_piece_10a, bisect_by=Plane(origin=(3, 9.360103187, 10.864896813), z_dir=(-1, 0, 0)), keep=Keep.TOP, mode=Mode.PRIVATE)
    with BuildSketch(Plane(origin=(3, 9.525, 7.7), x_dir=(-0.9996219169112968, 0.027495876610585408, -1.1837901526131803e-15), z_dir=(0, 0, 1))) as chamfer2_piece_10b_section:
        Polygon((CHAMFER2_SIZE * 0.999621916911, CHAMFER2_SIZE * 0.0274958766106), (-CHAMFER2_SIZE * 0.0274958766106, CHAMFER2_SIZE * 0.999621916911), (0, 0), align=None)
    chamfer2_piece_10b = extrude(amount=4.285841494, mode=Mode.PRIVATE)
    chamfer2_piece_10b = split(chamfer2_piece_10b, bisect_by=Plane(origin=(2.835103187, 9.360103187, 10.7), z_dir=(0, 0, 1)), keep=Keep.TOP, mode=Mode.PRIVATE)
    chamfer2_piece_10 = chamfer2_piece_10a & chamfer2_piece_10b
    add(chamfer2_piece_10, mode=Mode.SUBTRACT)

    # Sketch11 → Cut-Extrude10 (cut)
    with BuildSketch(Plane(origin=(0, 9.525, 0), x_dir=(1, 0, 0), z_dir=(0, 1, 0))):
        with Locations(Location((85.5, -38, 0), (0, 0, 180))):
            Circle(SKETCH11_R)
        with Locations(Location((4.5, -38, 0), (0, 0, 180))):
            Circle(SKETCH11_R)
    extrude(amount=-CUT_EXTRUDE10_DEPTH, mode=Mode.SUBTRACT)


solid = part.part
